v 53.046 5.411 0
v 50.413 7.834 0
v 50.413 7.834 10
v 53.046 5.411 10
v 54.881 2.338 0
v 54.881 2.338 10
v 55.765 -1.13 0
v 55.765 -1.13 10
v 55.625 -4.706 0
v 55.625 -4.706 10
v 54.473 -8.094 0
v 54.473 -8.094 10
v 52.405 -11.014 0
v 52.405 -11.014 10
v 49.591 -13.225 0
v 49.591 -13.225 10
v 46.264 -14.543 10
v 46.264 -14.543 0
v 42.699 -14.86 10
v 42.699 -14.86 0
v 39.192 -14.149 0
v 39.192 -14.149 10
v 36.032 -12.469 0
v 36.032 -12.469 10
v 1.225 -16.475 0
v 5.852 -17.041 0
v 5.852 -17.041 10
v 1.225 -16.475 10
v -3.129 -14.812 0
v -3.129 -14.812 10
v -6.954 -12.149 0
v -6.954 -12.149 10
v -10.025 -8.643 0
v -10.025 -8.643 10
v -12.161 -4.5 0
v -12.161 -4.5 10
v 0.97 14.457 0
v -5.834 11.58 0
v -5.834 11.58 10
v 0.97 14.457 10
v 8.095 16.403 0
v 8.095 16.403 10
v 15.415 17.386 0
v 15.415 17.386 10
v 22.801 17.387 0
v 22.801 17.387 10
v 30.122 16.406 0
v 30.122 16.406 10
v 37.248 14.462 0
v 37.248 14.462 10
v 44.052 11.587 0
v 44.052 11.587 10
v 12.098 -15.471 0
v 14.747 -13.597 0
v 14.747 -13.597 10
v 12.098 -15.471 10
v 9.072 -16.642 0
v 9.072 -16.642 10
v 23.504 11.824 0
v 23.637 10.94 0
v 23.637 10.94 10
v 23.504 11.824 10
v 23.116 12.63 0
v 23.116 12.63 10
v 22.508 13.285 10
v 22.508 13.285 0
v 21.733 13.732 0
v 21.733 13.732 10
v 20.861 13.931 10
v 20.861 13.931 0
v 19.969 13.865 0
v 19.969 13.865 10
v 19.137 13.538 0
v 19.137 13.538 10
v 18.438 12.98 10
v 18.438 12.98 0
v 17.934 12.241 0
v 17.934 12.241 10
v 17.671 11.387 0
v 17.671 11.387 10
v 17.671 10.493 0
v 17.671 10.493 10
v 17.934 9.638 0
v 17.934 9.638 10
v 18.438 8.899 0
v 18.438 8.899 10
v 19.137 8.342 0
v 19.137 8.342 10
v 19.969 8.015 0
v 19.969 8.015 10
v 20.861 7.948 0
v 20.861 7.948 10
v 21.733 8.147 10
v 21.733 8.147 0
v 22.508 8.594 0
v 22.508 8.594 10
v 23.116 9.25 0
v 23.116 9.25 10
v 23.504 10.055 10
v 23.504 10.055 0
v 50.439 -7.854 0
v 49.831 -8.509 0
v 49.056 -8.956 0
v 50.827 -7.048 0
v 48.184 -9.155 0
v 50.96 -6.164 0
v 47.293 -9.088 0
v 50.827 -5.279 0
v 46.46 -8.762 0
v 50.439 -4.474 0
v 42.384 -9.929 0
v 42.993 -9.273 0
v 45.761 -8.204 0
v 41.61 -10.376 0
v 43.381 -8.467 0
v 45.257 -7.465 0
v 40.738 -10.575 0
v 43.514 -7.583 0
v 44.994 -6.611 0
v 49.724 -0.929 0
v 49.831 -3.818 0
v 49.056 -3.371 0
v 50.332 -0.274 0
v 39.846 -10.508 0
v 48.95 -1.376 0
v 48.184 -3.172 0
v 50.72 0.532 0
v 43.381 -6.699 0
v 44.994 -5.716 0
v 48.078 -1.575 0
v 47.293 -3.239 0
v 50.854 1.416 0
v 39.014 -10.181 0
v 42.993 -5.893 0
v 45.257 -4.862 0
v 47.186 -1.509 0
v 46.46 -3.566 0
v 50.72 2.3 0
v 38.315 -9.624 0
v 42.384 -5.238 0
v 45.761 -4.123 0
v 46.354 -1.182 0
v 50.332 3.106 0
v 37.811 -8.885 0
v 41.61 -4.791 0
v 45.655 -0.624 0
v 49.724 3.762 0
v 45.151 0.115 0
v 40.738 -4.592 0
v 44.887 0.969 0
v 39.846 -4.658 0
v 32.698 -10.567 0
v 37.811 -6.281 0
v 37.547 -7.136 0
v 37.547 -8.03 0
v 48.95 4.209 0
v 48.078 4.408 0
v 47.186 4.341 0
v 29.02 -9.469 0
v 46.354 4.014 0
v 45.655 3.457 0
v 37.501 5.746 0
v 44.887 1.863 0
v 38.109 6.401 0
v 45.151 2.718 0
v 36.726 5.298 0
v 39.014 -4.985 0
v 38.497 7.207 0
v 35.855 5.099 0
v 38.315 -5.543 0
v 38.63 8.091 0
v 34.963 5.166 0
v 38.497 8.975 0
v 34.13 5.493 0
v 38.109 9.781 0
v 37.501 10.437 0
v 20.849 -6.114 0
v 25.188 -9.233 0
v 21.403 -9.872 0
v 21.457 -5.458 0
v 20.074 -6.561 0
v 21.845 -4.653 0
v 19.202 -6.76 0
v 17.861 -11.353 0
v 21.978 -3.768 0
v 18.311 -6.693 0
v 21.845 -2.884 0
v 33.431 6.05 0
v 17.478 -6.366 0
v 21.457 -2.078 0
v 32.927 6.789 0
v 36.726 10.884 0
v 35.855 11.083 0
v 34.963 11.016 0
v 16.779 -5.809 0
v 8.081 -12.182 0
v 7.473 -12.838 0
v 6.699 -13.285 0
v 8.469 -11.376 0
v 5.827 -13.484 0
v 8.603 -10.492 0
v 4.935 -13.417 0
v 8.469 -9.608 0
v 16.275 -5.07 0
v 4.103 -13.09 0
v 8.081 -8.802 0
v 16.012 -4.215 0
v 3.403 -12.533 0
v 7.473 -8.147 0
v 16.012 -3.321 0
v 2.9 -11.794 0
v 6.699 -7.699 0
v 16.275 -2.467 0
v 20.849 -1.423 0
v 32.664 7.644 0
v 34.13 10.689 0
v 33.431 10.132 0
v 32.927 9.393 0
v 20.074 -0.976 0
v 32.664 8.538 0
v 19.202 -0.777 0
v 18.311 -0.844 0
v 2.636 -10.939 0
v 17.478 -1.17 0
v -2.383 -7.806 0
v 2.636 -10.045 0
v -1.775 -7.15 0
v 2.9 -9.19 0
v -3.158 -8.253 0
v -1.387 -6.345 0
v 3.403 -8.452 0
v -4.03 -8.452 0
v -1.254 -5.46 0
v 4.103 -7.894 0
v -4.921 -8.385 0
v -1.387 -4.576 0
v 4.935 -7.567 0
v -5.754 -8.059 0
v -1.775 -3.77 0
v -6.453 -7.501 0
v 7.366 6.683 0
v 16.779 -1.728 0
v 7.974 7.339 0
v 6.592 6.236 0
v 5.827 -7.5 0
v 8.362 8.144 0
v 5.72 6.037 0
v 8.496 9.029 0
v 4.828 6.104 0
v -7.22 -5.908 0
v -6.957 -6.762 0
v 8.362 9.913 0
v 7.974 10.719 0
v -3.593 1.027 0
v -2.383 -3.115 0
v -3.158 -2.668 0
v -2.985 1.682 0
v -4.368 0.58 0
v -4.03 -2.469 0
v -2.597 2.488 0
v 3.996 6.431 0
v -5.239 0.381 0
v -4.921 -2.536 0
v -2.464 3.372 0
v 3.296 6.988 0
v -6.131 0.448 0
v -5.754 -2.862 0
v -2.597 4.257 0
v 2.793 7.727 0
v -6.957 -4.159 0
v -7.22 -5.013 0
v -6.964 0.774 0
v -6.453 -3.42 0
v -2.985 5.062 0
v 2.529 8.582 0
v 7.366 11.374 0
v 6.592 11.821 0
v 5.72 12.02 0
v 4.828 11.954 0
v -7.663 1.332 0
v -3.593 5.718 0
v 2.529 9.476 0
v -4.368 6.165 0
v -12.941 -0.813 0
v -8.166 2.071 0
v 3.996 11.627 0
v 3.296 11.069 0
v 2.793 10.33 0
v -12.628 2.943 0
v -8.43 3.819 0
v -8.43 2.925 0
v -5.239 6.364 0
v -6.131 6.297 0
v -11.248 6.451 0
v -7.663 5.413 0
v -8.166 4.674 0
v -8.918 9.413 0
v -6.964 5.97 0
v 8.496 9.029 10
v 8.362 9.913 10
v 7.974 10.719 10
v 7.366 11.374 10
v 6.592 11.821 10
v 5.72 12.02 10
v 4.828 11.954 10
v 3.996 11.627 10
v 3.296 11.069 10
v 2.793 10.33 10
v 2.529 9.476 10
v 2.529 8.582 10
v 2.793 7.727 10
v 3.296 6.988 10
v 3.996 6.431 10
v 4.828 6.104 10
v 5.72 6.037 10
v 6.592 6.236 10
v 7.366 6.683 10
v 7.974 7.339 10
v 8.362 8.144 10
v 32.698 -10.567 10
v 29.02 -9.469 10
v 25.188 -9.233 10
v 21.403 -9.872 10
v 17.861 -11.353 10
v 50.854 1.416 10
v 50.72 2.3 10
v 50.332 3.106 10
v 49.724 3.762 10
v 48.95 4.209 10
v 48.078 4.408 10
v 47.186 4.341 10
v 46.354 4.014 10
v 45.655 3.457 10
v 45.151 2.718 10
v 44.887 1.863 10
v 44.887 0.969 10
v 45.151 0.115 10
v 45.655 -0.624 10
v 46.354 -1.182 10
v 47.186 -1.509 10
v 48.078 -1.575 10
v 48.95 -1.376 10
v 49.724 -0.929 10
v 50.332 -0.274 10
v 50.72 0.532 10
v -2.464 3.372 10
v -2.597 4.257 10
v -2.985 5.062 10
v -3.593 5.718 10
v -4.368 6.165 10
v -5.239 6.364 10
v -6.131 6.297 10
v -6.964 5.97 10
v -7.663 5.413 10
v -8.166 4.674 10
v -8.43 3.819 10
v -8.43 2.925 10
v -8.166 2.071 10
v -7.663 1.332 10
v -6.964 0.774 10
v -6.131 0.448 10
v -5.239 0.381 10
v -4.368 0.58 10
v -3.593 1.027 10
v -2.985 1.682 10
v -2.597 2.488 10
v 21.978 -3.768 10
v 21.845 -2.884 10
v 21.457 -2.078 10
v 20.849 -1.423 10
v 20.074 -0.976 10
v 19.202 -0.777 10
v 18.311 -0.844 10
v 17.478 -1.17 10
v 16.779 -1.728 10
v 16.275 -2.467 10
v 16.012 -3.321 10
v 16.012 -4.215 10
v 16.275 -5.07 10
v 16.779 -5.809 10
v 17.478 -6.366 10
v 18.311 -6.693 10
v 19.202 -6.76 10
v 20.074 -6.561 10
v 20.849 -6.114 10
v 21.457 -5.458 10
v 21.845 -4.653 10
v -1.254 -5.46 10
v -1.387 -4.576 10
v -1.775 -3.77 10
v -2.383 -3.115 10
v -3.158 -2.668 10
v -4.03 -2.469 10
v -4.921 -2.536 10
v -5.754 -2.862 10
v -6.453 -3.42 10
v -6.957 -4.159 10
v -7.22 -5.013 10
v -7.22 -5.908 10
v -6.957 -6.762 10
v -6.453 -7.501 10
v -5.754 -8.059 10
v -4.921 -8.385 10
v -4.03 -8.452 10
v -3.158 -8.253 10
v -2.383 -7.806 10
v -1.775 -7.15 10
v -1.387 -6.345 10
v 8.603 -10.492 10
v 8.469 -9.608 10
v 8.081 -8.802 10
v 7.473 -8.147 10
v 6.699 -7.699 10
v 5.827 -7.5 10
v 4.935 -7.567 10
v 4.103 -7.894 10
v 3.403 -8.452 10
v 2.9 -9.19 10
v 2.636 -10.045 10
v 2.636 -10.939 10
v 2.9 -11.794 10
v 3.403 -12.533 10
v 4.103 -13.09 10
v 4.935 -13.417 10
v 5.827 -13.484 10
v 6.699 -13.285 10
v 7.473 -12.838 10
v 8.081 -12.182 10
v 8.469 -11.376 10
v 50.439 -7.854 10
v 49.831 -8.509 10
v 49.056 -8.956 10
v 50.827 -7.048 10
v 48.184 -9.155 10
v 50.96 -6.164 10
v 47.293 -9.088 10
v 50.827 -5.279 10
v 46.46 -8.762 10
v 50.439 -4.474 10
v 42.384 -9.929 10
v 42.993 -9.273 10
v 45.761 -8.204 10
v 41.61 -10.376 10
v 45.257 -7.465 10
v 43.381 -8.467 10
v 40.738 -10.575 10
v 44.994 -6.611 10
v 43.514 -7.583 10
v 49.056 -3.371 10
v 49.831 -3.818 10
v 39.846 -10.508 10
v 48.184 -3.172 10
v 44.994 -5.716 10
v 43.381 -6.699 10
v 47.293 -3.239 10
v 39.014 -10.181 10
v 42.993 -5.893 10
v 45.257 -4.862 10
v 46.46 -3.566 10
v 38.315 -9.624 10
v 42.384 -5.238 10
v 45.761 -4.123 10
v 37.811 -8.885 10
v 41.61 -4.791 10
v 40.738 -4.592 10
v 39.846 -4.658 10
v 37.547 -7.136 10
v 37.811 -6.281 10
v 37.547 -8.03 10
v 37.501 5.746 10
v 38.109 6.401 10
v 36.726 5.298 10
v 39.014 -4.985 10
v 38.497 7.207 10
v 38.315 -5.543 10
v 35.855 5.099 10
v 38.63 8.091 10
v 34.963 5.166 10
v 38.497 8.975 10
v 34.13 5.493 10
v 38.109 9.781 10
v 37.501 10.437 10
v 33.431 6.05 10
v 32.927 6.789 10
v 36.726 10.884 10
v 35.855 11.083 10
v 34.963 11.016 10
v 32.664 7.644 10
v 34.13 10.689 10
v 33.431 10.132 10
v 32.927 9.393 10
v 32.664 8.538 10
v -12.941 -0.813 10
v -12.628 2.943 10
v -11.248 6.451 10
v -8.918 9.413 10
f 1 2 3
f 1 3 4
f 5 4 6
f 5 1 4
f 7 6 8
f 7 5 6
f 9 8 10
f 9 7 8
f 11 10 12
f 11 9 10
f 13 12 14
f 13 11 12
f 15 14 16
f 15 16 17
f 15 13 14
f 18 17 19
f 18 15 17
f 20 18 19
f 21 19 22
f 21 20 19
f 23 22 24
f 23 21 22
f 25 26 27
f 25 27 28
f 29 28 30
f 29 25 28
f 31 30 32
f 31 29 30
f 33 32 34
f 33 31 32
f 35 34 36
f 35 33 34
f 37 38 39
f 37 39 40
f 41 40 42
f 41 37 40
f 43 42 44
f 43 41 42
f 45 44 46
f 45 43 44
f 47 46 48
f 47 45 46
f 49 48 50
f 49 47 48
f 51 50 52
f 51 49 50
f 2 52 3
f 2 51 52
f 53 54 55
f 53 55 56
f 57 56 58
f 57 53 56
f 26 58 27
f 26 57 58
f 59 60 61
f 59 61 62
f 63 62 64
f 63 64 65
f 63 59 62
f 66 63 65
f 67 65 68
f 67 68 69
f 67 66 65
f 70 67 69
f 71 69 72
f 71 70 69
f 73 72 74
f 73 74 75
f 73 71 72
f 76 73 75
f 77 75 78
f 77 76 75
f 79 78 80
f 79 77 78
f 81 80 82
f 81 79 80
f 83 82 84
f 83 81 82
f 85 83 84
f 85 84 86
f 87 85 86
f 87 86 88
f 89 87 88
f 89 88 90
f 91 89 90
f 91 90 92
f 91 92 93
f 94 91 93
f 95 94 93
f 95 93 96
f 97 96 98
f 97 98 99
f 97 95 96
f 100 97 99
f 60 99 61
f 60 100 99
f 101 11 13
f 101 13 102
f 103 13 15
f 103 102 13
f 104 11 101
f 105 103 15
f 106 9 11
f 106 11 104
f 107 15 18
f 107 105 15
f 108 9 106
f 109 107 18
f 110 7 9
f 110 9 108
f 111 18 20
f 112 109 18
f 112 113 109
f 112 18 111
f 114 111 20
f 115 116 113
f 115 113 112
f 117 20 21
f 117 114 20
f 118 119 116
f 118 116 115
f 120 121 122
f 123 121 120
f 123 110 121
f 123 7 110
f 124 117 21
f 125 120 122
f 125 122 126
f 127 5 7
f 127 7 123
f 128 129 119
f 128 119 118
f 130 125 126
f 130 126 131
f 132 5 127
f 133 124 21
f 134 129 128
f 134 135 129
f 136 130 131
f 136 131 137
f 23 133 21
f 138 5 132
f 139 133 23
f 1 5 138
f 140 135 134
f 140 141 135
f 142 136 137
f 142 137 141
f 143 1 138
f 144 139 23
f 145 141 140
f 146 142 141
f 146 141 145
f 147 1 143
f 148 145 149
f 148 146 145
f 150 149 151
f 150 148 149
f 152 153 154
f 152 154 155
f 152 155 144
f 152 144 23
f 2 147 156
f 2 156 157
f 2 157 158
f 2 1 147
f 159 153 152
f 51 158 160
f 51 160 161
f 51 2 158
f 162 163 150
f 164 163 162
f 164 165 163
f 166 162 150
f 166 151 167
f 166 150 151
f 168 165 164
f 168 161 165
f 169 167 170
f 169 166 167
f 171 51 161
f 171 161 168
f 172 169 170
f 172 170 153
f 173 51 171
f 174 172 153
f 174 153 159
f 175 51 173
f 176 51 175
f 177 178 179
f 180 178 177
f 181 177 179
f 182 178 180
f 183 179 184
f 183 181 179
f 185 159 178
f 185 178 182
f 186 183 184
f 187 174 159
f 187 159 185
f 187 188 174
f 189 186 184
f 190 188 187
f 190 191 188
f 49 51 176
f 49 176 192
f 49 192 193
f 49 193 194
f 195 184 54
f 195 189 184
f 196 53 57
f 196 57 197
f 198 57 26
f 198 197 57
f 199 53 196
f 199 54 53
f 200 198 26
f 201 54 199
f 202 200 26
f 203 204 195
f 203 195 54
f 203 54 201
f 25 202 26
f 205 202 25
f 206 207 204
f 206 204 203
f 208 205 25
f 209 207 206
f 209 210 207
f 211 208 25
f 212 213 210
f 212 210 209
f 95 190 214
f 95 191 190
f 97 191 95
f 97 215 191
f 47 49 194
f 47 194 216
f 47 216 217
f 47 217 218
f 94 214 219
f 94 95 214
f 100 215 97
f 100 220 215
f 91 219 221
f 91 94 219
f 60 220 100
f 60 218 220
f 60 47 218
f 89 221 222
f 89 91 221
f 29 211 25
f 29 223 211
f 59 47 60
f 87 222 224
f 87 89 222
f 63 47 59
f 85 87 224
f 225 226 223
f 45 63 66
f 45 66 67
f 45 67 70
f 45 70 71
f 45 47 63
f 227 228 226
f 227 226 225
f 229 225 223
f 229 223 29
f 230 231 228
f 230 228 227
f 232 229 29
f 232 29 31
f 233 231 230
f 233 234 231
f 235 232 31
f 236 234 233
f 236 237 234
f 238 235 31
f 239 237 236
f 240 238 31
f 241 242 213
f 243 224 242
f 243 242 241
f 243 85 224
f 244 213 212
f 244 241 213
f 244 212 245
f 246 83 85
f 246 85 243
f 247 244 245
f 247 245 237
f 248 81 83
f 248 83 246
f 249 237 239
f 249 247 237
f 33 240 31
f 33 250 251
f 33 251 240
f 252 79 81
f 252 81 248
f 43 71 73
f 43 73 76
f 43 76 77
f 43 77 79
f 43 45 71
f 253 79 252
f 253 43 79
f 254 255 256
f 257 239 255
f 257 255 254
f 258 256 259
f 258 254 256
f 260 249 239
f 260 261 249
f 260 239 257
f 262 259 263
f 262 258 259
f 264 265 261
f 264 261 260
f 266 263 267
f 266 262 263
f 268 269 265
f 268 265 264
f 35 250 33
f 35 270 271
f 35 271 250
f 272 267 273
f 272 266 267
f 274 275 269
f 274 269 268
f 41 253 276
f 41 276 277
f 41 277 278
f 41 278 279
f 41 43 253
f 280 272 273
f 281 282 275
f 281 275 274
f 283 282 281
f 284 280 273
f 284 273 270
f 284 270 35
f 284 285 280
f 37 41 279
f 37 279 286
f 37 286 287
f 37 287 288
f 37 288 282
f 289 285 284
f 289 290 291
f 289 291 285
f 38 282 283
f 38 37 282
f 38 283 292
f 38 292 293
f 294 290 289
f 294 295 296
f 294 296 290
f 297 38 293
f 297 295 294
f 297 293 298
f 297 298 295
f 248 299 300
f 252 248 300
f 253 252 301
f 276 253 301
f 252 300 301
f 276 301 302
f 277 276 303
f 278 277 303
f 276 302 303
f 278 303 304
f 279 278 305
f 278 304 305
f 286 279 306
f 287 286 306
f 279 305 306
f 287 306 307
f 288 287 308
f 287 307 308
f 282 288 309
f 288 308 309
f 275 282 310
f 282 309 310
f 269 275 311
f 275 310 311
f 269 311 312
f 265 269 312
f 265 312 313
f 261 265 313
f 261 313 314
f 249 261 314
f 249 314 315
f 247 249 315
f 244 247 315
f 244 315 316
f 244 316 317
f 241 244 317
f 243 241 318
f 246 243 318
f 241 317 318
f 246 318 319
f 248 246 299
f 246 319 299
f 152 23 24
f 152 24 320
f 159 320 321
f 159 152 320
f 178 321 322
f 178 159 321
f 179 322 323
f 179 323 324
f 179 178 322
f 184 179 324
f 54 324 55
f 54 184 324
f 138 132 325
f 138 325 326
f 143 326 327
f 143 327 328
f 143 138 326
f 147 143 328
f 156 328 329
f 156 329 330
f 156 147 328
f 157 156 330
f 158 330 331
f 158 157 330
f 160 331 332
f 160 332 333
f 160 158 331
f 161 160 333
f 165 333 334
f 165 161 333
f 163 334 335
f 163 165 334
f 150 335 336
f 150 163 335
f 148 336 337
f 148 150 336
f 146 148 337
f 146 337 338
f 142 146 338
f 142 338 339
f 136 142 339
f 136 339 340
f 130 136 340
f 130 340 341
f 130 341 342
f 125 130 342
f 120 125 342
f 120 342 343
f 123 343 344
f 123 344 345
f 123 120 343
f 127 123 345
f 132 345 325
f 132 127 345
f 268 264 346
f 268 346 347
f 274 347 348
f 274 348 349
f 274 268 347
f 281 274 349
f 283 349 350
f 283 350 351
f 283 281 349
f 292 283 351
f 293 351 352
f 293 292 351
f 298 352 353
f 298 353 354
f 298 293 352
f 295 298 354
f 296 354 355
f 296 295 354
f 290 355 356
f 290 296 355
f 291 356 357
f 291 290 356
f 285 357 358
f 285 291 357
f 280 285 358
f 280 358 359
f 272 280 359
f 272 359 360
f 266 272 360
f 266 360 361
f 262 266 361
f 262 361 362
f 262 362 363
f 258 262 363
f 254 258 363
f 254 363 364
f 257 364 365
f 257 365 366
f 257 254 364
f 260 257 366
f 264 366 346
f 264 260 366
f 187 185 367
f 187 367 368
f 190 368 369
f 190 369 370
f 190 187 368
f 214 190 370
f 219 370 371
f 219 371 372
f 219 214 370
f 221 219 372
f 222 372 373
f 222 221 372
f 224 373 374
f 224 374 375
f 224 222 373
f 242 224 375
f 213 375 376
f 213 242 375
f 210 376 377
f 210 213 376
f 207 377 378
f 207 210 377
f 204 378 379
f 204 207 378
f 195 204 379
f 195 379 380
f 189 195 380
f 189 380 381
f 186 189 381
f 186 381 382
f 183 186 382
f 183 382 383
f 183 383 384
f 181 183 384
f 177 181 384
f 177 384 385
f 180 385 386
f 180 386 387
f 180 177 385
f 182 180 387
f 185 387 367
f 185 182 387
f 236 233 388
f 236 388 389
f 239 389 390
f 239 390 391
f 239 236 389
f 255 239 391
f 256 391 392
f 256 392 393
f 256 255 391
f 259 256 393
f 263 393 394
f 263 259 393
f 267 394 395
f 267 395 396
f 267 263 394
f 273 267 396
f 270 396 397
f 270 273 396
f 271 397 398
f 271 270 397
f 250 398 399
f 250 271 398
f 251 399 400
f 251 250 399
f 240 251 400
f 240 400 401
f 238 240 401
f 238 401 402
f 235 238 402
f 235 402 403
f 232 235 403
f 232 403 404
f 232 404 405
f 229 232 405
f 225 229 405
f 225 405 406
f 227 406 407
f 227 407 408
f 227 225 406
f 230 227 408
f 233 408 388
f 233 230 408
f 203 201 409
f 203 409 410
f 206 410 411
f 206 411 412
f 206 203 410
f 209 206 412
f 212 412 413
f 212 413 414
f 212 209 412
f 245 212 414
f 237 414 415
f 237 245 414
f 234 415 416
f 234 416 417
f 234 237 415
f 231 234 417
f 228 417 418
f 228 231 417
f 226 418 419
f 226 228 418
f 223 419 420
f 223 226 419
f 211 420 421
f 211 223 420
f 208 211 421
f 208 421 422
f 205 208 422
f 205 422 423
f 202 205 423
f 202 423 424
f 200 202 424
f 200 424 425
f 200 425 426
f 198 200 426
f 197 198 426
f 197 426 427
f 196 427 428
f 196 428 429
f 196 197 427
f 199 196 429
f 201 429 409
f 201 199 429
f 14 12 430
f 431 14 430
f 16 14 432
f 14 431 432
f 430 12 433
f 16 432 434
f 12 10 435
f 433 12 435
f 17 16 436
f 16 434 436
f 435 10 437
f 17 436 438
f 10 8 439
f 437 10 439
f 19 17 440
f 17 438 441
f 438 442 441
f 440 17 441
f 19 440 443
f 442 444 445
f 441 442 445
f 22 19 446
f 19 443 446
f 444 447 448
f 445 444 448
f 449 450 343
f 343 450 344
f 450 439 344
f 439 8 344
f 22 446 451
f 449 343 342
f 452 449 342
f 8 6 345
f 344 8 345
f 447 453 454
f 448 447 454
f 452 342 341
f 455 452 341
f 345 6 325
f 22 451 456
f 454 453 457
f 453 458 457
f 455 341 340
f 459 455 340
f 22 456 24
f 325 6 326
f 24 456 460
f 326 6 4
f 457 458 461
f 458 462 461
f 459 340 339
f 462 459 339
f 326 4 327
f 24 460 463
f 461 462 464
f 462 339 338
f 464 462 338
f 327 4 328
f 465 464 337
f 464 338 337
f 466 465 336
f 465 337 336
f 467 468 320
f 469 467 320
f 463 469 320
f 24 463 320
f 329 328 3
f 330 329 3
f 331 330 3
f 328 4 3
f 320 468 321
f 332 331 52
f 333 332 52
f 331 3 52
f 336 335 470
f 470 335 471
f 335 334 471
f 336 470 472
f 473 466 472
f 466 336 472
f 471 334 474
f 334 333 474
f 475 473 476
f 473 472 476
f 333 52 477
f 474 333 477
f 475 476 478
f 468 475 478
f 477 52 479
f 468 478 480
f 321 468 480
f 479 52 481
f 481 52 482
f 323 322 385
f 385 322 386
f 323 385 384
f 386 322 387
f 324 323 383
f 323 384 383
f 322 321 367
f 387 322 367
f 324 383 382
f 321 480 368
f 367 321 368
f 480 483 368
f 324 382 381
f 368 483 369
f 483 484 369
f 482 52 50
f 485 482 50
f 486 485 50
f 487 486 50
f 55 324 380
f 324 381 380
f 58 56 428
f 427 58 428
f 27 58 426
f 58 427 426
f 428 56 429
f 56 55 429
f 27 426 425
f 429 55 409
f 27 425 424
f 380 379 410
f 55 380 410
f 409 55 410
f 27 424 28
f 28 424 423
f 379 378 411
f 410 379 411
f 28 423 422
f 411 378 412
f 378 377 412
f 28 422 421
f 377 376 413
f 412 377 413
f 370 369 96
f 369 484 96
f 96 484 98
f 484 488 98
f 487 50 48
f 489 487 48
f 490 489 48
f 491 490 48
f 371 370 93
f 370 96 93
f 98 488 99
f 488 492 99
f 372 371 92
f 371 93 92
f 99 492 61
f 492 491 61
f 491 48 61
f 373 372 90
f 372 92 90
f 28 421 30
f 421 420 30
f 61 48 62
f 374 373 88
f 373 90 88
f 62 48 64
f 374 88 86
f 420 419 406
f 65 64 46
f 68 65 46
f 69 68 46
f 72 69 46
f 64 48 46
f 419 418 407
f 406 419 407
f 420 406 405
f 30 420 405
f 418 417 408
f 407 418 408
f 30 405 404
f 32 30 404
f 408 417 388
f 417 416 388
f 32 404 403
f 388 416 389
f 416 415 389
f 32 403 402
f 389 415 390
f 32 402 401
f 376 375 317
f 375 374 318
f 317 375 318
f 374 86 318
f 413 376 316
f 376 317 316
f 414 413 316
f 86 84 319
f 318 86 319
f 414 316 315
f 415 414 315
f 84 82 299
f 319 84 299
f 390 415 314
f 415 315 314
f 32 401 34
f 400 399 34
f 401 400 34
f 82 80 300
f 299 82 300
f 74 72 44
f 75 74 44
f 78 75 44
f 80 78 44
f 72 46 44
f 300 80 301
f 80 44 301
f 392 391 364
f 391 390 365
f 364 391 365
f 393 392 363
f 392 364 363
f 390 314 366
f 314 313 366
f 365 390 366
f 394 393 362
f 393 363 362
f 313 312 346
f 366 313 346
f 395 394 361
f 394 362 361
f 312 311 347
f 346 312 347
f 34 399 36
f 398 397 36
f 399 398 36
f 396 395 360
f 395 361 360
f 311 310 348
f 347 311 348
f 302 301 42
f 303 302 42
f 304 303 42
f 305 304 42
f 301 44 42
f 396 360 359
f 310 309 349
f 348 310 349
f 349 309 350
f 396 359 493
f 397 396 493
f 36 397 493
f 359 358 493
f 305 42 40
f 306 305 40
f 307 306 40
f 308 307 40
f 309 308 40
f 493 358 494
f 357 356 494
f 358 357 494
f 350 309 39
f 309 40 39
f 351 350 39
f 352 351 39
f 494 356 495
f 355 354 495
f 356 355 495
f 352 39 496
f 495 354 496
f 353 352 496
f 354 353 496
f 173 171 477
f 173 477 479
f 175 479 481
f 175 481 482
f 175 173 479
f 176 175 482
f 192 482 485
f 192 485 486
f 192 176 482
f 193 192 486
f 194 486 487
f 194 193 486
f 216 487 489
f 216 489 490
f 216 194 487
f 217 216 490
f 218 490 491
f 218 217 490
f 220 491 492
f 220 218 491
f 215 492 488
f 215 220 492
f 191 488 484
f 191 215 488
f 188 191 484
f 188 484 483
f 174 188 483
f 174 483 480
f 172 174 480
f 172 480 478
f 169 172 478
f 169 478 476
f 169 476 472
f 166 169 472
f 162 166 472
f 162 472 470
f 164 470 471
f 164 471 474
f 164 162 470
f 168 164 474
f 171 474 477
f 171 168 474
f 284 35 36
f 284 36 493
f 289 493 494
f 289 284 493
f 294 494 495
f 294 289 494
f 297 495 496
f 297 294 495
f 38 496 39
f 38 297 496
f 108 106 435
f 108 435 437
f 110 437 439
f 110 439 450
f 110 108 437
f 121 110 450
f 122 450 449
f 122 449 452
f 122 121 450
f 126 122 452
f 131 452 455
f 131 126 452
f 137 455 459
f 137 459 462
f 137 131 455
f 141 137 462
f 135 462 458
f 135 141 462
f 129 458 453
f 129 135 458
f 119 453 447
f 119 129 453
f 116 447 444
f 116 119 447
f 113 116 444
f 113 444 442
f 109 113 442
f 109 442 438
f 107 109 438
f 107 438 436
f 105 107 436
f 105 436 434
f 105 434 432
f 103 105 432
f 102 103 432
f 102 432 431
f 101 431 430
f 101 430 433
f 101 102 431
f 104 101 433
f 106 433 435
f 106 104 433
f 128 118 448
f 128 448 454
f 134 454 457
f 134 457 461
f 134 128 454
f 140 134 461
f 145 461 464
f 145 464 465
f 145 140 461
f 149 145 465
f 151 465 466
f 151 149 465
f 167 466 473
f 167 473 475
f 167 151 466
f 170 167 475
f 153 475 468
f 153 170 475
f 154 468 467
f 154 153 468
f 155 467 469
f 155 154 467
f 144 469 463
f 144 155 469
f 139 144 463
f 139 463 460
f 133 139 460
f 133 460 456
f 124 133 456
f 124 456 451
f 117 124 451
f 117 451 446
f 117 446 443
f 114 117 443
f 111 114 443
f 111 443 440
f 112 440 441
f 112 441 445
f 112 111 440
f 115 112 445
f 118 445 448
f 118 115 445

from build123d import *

# Parameters (mm, degrees)
BOSS_EXTRUDE1_DEPTH   = 10
SKETCH2_R             = 3
CUT_EXTRUDE1_DEPTH    = 10
CRVPATTERN1_OUTLINE_R = 3
CRVPATTERN1_DEPTH     = 10


# Read off the part's stored shape, not the designer's step: CrvPattern1
with BuildPart() as part:
    # Sketch1 → Boss-Extrude1 (new body)
    with BuildSketch(Plane.XY):
        with BuildLine():
            ThreePointArc((-12.160643086, -4.500395473), (-12.066298067, 4.747552068), (-5.833593115, 11.580327761))
            ThreePointArc((-5.833593115, 11.580327761), (22.801277697, 17.386949302), (50.413138808, 7.834054132))
            ThreePointArc((50.413138808, 7.834054132), (53.544482095, -9.628731125), (36.032050188, -12.46931353))
            ThreePointArc((36.032050188, -12.46931353), (25.188301018, -9.23349986), (14.747114027, -13.59687016))
            ThreePointArc((14.747114027, -13.59687016), (10.621121624, -16.149691652), (5.851758877, -17.040696634))
            ThreePointArc((5.851758877, -17.040696634), (-5.122139447, -13.59687016), (-12.160643086, -4.500395473))
        make_face()
    extrude(amount=BOSS_EXTRUDE1_DEPTH)

    # Sketch2 → Cut-Extrude1 (cut)
    with BuildSketch(Plane.XY.offset(10)):
        with Locations((5.495652988, 9.028732309)):
            Circle(SKETCH2_R)
    extrude(amount=-CUT_EXTRUDE1_DEPTH, mode=Mode.SUBTRACT)

    # CrvPattern1 outline → CrvPattern1 (cut)
    with BuildSketch(Plane.XY):
        with Locations((-5.463573367, 3.372342928)):
            Circle(CRVPATTERN1_OUTLINE_R)
        with Locations((-4.253847863, -5.460432999)):
            Circle(CRVPATTERN1_OUTLINE_R)
        with Locations((5.602614411, -10.492104281)):
            Circle(CRVPATTERN1_OUTLINE_R)
        with Locations((18.978303952, -3.768285721)):
            Circle(CRVPATTERN1_OUTLINE_R)
        with Locations((40.513825045, -7.583139488)):
            Circle(CRVPATTERN1_OUTLINE_R)
        with Locations((47.960307029, -6.163614465)):
            Circle(CRVPATTERN1_OUTLINE_R)
        with Locations((47.853730427, 1.416213148)):
            Circle(CRVPATTERN1_OUTLINE_R)
        with Locations((35.630316045, 8.091012477)):
            Circle(CRVPATTERN1_OUTLINE_R)
        with Locations((20.637040529, 10.939744191)):
            Circle(CRVPATTERN1_OUTLINE_R)
    extrude(amount=CRVPATTERN1_DEPTH, mode=Mode.SUBTRACT)


solid = part.part
